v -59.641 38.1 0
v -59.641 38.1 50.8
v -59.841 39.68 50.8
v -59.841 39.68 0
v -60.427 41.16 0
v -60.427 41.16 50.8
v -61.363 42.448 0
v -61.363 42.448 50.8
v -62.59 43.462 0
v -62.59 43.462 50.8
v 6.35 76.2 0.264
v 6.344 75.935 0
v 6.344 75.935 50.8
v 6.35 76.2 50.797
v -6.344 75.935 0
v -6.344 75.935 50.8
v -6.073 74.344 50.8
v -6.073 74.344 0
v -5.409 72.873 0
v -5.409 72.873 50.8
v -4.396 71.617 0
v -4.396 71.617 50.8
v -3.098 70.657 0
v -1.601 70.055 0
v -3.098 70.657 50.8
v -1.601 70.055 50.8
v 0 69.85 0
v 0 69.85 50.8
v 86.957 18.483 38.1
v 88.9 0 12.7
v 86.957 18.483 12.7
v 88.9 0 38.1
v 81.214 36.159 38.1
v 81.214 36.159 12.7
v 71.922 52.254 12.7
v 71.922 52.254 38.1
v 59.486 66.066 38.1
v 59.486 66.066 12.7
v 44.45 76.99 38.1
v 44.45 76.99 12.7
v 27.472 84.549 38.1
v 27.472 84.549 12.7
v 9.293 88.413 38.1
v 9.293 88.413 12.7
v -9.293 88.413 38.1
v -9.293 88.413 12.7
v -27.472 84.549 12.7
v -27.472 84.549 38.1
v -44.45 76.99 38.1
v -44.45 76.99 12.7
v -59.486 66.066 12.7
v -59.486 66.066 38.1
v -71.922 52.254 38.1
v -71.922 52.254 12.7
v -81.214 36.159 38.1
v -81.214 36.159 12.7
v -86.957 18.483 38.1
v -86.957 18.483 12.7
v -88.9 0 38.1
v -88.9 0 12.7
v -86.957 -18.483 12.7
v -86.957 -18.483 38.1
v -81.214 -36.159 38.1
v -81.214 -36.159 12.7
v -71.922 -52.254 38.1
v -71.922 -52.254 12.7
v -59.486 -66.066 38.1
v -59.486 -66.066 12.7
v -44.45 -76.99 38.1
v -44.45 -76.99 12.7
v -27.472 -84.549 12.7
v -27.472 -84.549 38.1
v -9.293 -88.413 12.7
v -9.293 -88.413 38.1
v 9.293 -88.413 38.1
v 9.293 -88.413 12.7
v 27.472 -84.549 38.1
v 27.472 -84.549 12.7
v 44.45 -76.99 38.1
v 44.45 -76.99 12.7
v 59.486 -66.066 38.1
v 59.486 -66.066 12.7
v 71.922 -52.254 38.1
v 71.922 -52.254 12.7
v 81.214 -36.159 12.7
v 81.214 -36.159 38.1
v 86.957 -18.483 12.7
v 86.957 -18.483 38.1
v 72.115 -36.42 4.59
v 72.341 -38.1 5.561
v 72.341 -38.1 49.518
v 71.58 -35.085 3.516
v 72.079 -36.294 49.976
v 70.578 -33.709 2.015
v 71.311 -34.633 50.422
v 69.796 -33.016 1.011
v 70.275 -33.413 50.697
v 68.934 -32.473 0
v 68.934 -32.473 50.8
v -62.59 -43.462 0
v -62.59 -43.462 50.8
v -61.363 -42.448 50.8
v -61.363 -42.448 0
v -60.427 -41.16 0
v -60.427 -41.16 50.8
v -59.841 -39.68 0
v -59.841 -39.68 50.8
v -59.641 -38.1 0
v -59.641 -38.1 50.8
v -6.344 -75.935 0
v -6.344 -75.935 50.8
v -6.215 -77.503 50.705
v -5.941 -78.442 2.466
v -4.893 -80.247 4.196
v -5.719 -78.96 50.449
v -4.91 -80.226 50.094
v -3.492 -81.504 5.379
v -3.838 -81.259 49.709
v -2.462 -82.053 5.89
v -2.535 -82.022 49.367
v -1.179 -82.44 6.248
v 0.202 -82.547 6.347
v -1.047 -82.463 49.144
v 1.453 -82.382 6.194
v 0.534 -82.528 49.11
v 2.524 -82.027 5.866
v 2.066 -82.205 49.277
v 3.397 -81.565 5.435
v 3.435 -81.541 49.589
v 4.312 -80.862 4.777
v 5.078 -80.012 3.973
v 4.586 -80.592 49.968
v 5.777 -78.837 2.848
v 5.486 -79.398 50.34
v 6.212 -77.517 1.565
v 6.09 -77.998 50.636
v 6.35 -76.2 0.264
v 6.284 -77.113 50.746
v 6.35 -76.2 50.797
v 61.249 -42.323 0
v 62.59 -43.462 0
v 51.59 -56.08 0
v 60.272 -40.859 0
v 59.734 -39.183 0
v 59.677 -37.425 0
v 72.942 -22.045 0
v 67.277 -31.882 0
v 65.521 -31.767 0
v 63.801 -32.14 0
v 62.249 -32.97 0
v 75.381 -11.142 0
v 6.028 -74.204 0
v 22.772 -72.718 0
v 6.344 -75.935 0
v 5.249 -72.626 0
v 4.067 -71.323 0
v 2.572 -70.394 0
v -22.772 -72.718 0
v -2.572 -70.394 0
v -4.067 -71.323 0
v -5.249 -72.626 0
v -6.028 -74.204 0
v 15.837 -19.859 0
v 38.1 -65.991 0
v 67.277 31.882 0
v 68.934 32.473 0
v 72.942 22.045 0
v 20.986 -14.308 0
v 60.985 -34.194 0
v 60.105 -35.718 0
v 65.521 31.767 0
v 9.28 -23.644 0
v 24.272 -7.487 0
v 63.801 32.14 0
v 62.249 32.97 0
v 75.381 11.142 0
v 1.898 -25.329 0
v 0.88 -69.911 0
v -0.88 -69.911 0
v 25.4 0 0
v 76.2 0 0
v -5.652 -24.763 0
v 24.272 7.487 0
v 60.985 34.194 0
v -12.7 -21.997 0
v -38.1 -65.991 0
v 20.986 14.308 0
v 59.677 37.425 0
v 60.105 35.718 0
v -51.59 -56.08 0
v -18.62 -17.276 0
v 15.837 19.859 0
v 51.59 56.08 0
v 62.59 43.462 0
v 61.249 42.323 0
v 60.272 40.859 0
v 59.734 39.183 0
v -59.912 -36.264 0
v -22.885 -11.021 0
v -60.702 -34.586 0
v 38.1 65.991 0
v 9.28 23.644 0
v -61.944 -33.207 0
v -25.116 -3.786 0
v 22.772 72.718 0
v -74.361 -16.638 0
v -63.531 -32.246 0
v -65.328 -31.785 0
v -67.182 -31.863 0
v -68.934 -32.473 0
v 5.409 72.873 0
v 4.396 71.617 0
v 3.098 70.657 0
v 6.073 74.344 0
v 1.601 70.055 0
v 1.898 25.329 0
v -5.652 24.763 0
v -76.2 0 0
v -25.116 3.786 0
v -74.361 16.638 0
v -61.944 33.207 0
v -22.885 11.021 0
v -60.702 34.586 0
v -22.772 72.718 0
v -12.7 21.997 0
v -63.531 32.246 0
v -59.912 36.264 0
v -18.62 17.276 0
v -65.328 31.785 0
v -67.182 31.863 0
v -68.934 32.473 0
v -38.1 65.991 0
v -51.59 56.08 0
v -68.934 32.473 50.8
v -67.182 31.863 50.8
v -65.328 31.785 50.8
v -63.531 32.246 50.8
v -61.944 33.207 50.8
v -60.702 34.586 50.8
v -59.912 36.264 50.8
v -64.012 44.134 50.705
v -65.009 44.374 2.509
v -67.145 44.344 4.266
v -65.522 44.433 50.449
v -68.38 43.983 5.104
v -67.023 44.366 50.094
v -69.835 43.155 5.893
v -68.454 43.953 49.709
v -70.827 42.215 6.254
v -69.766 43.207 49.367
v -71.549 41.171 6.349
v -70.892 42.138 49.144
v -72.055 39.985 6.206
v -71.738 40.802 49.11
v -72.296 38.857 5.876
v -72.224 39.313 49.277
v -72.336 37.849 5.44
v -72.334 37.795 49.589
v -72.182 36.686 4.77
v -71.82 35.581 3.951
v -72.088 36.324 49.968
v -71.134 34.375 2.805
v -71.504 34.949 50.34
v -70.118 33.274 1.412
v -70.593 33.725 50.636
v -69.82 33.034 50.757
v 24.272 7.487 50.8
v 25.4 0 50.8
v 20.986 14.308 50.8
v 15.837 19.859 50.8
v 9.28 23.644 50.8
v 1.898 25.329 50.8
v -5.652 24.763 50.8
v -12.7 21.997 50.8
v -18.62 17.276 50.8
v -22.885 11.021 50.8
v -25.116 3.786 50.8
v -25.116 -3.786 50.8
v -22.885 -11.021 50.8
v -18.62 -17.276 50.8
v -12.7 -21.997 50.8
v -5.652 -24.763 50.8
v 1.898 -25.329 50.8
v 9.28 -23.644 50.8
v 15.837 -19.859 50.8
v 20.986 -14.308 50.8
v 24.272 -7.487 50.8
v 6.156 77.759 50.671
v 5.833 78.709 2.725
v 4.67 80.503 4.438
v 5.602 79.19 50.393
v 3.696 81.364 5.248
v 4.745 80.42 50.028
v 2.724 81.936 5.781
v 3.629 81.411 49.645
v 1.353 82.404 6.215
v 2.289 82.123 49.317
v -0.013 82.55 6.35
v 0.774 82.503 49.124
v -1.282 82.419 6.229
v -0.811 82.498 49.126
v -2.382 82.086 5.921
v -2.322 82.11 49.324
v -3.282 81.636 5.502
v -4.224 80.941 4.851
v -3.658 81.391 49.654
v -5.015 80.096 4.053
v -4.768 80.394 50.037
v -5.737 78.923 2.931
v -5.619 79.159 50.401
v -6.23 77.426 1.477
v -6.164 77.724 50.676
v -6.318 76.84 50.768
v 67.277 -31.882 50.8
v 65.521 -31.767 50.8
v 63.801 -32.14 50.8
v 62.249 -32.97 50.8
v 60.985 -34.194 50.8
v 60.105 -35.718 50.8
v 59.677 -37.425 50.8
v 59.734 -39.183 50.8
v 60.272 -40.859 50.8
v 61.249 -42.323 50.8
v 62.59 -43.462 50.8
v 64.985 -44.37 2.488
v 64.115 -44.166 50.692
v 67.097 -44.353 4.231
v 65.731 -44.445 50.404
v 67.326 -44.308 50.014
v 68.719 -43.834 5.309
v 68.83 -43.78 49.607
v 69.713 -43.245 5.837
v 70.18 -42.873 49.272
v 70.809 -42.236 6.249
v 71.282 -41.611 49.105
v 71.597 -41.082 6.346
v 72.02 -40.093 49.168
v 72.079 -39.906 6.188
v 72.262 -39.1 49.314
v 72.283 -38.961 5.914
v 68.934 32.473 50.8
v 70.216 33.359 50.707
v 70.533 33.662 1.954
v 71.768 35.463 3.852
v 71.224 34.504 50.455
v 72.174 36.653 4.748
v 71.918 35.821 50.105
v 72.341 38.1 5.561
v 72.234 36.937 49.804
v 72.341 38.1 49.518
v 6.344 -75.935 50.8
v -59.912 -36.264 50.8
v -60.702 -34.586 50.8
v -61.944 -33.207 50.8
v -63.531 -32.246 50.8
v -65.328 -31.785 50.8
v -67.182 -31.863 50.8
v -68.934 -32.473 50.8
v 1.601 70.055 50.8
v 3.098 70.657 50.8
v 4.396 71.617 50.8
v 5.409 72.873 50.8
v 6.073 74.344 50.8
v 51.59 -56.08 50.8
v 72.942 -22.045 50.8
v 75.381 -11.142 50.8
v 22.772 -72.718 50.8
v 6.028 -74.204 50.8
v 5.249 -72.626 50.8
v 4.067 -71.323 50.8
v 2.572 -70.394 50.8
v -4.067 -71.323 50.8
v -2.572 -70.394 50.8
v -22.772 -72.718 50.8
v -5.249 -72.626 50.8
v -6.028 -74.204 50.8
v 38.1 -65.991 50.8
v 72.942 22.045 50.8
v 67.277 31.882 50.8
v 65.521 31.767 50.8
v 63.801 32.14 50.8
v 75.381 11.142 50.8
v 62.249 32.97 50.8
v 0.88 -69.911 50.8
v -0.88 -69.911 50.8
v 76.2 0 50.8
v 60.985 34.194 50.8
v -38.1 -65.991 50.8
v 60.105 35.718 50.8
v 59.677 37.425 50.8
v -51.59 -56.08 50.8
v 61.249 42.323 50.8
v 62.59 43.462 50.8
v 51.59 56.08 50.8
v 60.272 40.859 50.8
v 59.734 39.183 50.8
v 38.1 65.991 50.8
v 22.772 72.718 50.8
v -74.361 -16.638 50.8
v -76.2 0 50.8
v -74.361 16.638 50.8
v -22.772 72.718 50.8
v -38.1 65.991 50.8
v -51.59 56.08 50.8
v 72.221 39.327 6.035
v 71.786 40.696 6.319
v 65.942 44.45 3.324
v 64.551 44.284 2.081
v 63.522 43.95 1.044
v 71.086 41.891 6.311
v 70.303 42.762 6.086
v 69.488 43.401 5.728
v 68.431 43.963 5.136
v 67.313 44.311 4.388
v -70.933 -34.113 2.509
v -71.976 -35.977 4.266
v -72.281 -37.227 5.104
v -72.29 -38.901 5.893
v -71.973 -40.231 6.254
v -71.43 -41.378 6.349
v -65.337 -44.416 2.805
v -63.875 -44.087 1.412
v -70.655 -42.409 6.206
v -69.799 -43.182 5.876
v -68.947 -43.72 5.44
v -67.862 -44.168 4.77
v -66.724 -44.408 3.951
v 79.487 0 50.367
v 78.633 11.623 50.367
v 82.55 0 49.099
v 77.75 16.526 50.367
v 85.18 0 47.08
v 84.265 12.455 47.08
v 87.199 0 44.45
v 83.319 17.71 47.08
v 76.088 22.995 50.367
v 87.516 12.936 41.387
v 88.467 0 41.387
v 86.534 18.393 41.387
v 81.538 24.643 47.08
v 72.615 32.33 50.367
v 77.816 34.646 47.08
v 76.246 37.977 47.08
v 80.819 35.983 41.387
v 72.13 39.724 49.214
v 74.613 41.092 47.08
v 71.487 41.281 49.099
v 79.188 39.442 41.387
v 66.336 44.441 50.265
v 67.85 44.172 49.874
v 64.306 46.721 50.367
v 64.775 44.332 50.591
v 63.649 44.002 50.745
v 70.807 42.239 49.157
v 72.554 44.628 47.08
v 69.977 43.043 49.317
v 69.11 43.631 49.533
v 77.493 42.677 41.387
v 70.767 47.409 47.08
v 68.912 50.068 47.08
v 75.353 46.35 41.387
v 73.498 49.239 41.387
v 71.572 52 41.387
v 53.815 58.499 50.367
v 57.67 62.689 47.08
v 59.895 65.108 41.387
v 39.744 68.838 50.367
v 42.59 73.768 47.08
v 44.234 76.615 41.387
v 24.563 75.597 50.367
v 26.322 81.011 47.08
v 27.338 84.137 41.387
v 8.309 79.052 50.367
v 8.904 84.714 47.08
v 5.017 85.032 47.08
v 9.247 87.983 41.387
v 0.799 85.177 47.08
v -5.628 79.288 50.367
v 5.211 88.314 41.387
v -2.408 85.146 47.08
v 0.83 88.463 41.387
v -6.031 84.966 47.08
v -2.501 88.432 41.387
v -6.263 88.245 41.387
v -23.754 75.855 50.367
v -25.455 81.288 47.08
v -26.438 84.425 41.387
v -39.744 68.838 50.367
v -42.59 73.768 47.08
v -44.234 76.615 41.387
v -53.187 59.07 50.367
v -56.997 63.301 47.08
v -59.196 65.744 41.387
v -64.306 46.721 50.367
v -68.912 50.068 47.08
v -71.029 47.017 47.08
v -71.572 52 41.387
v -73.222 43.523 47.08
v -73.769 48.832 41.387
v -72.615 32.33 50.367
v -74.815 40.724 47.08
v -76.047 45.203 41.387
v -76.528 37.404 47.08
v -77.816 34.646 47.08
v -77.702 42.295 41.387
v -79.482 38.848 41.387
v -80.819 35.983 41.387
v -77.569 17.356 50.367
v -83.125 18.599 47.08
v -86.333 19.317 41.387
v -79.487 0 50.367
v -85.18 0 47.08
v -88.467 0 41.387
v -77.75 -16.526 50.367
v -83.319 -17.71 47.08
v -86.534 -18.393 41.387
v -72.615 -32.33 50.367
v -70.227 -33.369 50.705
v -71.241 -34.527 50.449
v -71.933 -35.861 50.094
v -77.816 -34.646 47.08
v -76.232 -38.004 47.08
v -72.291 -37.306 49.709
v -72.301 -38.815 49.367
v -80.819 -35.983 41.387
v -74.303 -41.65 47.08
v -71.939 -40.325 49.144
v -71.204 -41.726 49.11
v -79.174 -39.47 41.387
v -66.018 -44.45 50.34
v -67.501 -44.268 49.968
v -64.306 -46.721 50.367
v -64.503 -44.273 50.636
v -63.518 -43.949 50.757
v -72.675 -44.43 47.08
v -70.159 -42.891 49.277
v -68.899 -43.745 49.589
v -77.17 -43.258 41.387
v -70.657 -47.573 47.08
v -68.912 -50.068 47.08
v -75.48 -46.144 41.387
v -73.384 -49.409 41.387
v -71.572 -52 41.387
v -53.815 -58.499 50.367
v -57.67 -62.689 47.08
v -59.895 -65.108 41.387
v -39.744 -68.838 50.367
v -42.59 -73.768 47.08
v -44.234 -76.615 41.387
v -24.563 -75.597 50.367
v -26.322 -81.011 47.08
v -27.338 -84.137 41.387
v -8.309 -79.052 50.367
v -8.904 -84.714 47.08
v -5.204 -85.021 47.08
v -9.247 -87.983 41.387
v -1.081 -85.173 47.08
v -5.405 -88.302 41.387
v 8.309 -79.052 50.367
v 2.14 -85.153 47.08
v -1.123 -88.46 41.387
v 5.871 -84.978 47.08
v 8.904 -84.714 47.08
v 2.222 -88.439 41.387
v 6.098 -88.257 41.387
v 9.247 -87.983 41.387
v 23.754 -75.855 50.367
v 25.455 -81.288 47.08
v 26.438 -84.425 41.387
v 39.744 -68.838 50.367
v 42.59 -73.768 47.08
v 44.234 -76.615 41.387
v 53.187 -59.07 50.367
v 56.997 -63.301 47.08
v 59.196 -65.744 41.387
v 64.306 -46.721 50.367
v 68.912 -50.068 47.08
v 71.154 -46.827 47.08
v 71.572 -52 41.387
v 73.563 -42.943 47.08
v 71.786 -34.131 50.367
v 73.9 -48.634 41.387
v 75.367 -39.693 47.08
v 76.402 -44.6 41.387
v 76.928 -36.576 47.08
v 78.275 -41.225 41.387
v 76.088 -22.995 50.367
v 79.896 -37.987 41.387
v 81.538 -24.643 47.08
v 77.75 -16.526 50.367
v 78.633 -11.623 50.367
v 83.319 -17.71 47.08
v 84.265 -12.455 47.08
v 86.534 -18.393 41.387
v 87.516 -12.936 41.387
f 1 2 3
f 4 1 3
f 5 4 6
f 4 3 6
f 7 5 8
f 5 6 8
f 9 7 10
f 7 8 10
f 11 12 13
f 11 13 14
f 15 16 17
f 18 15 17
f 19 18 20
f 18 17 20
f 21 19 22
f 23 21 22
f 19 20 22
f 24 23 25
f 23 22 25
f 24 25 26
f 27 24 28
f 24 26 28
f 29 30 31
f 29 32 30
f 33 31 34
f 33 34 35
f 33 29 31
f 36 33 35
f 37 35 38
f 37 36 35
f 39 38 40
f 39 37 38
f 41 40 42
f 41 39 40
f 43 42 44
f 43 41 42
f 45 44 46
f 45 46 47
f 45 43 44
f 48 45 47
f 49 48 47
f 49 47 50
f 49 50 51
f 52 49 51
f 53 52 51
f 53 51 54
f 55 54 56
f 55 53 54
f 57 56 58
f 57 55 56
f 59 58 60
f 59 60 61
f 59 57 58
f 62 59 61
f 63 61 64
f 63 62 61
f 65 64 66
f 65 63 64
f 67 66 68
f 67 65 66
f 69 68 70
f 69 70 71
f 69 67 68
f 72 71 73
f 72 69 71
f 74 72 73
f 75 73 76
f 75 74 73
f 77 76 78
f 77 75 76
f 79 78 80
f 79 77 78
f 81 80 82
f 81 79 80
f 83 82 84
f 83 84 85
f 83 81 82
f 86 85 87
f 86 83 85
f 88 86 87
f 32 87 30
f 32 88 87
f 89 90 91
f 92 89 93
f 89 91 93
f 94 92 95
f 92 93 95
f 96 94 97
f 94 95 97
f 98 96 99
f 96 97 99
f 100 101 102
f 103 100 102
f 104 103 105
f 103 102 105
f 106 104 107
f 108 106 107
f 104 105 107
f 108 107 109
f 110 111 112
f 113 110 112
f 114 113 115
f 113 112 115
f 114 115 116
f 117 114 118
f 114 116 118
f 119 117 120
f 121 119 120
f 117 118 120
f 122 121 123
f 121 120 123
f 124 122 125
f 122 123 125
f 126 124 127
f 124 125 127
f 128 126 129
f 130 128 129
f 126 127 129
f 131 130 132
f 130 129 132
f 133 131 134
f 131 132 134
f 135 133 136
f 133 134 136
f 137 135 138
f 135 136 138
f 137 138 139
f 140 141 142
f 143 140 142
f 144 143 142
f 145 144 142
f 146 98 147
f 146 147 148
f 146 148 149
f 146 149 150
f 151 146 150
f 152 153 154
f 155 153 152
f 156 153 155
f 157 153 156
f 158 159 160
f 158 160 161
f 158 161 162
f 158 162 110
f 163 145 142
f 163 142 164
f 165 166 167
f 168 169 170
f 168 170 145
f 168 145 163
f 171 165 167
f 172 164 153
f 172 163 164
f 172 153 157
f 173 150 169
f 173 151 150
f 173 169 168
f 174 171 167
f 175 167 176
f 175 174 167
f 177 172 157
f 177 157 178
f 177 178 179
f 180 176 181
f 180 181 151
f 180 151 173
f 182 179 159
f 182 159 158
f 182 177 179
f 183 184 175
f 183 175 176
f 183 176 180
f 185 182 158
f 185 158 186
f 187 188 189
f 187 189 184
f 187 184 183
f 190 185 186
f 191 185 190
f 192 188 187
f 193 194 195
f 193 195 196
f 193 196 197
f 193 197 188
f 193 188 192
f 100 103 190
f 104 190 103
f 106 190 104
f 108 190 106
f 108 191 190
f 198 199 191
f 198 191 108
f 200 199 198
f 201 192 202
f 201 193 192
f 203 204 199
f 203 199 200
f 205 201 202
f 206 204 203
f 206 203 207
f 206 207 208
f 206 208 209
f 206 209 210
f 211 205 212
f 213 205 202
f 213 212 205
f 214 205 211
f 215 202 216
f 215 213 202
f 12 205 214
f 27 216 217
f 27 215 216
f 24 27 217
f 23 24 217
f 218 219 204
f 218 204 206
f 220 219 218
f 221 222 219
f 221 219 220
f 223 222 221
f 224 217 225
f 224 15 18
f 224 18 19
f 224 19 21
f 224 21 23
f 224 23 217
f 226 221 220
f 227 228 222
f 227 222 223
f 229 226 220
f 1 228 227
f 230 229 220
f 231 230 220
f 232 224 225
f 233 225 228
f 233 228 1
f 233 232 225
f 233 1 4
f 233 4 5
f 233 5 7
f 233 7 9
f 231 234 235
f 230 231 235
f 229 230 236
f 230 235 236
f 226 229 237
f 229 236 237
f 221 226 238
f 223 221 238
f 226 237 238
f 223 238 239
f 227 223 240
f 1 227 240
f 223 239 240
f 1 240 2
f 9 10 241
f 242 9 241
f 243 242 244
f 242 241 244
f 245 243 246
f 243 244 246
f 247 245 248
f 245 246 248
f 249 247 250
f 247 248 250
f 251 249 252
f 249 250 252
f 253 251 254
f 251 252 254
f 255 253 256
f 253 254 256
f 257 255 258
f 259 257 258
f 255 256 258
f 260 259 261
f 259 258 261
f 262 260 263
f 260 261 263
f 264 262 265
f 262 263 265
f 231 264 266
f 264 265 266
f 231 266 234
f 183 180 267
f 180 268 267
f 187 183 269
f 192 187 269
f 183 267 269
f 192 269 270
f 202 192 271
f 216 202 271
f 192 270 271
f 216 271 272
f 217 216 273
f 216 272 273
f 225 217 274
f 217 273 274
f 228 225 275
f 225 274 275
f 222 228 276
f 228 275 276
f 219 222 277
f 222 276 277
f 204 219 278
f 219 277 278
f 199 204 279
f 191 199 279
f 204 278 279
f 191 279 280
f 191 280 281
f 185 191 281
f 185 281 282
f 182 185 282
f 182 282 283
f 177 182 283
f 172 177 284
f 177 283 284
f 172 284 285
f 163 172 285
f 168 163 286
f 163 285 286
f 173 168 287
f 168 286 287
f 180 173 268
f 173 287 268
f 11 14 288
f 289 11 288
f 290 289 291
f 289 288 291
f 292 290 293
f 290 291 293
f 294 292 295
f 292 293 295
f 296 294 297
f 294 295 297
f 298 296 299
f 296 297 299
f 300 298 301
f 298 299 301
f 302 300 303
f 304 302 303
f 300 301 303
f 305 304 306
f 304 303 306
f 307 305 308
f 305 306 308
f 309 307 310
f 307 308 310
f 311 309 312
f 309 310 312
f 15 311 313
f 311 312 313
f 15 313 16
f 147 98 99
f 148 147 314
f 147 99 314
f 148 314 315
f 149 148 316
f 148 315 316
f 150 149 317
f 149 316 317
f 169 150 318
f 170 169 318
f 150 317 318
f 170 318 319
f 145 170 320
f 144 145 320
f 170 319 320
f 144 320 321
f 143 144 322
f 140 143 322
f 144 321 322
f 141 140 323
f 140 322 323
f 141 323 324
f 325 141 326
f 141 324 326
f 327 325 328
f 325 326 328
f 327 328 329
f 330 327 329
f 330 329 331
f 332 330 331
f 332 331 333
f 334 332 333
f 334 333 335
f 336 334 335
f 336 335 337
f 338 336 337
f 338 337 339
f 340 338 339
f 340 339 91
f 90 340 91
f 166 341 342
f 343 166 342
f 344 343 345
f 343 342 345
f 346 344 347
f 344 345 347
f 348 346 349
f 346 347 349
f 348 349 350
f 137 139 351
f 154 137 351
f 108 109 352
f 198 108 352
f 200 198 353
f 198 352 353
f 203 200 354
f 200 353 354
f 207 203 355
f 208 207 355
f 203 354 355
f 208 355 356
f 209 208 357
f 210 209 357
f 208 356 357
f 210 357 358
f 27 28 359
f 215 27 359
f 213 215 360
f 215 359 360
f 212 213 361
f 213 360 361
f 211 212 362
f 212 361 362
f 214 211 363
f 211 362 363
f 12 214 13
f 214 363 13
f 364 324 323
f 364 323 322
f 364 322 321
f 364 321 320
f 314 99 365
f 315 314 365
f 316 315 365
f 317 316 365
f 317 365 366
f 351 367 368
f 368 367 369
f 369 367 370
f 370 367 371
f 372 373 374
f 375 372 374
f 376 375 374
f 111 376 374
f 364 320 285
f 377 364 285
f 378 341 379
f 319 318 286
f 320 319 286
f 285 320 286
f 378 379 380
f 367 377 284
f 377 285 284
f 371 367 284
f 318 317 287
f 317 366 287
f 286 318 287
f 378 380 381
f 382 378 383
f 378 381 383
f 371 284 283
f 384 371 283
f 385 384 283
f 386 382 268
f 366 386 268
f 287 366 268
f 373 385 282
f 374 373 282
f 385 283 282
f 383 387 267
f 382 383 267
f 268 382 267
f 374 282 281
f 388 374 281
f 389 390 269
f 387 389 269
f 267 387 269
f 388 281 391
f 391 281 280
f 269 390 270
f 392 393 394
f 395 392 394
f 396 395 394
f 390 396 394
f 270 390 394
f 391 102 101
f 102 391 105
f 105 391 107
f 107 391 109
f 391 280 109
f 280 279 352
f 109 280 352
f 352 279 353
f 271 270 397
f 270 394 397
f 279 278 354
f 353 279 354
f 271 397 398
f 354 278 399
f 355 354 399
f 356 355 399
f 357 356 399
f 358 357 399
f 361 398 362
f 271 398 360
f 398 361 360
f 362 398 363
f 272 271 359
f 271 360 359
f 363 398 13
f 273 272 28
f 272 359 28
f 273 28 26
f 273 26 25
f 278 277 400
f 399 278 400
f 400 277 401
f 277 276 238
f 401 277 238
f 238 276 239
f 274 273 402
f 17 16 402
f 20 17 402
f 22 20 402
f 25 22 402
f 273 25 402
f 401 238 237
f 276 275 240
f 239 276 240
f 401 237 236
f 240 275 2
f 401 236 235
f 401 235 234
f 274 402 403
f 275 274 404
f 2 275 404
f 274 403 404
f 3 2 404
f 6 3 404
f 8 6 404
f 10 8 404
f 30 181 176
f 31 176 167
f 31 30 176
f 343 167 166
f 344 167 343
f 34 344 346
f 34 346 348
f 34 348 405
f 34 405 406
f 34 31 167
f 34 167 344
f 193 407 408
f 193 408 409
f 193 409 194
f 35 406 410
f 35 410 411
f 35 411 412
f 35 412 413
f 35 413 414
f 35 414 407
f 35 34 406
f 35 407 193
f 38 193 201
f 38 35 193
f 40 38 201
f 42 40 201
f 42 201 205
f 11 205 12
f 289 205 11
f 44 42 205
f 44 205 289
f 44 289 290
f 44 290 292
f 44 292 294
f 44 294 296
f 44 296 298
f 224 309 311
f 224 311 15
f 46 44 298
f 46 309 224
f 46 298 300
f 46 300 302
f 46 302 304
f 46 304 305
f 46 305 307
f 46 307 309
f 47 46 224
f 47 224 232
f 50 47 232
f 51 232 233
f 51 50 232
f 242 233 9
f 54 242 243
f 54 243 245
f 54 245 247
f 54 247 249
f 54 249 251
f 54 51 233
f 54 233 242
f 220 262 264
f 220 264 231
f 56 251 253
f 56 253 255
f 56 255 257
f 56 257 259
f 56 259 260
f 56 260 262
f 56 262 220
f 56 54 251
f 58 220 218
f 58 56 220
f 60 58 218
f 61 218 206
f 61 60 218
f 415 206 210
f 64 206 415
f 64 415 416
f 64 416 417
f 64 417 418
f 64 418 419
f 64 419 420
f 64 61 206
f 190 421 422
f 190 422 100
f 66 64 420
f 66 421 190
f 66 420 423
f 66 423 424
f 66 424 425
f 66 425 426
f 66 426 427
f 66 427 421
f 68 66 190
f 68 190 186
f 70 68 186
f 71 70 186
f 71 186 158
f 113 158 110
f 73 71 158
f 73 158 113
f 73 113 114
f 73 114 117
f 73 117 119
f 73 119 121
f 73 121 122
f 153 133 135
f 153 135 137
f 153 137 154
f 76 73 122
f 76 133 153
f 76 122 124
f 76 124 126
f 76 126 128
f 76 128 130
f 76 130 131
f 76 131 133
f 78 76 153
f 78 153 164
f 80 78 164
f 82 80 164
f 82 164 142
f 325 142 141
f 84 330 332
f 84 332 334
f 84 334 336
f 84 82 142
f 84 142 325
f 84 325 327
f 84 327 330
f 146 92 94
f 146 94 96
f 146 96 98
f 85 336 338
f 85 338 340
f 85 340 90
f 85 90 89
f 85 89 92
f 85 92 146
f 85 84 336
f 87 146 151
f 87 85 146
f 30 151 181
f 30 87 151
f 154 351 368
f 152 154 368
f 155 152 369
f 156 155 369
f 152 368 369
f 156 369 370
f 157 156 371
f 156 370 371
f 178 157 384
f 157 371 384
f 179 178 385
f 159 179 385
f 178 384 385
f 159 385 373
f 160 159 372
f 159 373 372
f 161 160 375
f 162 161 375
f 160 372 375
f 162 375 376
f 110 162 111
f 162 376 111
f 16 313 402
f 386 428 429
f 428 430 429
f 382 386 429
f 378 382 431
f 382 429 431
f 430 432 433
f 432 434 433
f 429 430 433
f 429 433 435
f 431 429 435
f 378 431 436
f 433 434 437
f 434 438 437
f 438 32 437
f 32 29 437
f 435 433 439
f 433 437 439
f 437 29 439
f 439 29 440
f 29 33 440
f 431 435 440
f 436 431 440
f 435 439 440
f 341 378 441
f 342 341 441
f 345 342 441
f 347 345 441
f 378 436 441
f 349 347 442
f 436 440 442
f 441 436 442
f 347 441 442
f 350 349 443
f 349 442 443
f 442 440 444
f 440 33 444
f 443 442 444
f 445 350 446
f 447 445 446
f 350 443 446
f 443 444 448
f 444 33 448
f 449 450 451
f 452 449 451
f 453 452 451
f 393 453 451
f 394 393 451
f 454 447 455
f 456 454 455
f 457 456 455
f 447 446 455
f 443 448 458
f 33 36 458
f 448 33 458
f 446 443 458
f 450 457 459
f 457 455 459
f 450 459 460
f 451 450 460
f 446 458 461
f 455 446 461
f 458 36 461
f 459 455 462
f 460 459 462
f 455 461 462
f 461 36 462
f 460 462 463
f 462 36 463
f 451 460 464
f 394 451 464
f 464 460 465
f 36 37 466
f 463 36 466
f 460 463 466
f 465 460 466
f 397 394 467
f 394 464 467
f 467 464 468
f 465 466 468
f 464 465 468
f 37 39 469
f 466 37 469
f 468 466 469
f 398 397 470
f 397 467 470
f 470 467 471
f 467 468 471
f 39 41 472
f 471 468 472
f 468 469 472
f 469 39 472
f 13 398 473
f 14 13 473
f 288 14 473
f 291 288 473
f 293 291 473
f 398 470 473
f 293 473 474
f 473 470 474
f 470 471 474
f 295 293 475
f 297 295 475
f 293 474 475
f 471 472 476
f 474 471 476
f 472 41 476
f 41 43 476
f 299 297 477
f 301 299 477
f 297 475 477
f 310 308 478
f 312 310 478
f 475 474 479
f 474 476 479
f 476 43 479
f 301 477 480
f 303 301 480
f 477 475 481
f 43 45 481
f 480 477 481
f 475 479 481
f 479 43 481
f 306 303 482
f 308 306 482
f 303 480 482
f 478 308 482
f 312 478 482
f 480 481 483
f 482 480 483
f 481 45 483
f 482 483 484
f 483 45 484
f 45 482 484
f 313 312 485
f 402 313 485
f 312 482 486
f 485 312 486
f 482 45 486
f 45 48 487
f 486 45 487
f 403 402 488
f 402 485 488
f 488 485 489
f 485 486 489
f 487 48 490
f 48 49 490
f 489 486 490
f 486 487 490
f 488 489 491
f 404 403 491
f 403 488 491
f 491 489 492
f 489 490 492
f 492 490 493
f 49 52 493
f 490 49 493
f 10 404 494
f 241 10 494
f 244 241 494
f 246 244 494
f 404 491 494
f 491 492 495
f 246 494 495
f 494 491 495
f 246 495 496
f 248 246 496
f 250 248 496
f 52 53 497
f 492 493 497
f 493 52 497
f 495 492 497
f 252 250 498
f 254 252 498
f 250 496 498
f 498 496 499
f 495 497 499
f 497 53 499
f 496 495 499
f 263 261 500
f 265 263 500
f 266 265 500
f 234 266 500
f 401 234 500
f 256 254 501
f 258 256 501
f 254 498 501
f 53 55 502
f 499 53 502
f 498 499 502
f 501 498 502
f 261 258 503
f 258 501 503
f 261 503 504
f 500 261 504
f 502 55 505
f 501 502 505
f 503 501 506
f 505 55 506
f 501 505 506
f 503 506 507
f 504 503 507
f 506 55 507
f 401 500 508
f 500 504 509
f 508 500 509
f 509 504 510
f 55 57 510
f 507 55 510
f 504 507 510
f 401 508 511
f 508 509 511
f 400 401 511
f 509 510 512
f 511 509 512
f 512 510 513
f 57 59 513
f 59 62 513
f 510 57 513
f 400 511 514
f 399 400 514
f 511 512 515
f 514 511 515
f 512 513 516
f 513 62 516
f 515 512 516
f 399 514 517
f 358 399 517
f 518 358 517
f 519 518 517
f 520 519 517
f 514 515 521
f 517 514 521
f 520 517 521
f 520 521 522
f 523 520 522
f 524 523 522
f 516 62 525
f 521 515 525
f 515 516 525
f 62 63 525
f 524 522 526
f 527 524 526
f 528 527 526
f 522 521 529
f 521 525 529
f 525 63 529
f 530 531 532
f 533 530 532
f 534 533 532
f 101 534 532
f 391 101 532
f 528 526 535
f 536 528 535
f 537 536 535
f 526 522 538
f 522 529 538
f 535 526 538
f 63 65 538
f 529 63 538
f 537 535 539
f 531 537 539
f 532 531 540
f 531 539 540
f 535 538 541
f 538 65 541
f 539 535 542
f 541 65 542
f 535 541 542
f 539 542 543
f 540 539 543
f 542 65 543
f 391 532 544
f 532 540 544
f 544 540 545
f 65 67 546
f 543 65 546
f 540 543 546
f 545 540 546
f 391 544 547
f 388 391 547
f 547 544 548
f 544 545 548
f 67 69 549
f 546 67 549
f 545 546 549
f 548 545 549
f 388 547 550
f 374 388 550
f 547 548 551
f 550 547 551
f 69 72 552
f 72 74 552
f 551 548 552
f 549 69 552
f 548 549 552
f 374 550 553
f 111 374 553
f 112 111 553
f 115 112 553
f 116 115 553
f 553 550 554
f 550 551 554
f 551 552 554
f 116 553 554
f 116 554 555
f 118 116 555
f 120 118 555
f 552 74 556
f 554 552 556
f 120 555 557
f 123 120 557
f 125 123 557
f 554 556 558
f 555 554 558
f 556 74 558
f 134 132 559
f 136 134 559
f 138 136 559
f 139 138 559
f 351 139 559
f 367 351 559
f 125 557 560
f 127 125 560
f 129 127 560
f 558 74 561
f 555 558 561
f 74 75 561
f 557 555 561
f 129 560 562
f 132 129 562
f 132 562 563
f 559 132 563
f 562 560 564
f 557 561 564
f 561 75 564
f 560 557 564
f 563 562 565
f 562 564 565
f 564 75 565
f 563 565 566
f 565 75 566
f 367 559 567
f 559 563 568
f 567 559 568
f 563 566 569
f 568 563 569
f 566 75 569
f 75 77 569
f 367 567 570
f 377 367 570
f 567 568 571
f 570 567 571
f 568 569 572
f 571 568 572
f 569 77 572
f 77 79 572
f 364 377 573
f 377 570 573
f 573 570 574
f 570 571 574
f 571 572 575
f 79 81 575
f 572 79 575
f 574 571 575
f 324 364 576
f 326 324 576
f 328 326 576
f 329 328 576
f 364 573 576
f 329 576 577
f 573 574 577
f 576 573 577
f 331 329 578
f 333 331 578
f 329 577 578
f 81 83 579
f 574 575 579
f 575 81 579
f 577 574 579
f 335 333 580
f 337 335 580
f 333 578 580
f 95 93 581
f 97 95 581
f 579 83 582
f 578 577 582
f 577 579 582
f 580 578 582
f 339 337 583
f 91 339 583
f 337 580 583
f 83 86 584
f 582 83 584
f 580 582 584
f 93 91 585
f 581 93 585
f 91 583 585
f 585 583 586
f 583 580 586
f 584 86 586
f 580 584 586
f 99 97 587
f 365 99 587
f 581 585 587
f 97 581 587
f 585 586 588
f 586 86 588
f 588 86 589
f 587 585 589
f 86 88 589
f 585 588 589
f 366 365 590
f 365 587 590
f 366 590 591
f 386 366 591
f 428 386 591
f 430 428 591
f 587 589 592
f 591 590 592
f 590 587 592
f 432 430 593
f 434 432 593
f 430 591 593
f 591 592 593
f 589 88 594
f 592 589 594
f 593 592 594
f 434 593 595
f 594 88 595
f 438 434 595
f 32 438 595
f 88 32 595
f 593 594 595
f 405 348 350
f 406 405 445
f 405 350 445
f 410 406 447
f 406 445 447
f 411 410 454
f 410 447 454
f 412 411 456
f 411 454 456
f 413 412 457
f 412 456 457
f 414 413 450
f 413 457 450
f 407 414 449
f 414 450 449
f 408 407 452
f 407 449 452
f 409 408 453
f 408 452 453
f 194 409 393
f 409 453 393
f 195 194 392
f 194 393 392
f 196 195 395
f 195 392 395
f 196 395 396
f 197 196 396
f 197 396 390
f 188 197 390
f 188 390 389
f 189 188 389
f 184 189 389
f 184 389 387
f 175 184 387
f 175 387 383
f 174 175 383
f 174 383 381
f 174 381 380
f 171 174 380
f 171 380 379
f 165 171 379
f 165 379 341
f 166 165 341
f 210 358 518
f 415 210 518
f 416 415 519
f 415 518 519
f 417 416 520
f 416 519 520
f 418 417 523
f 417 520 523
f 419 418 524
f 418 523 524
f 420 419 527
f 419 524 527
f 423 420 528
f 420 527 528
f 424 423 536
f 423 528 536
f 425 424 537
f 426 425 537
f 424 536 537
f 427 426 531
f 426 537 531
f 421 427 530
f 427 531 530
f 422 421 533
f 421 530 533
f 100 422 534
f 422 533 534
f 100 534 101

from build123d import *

# Parameters (mm, degrees)
F0_W     = 63.5
F0_H     = 50.8
F4_DEPTH = 76.201


# Not quite as in the source:
# - a fillet or chamfer that OpenCascade refuses, or shapes differently, is made with other operations: its cross-section is extruded or revolved along the edge and cut away or added


with BuildPart() as f1:
    # F0 (on Front) → F1 (revolve)
    with BuildSketch(Plane.XZ):
        with Locations((57.15, 25.4)):
            Rectangle(F0_W, F0_H)
    revolve(axis=Axis((0, 0, 63.5), (0, 0, 1)))

    # F3 (on offset) → F4 (cut, through all)
    with BuildSketch(Plane.XY.offset(76.2)):
        with BuildLine():
            ThreePointArc((0, 76.2), (3.175, 76.1338254326), (6.3444854527, 75.9354166667))
            ThreePointArc((6.3444854527, 75.9354166667), (6.3486212135, 76.0676796024), (6.35, 76.2))
            ThreePointArc((6.35, 76.2), (-0.1323203976, 82.5486212135), (-6.3444854527, 75.9354166667))
            ThreePointArc((-6.3444854527, 75.9354166667), (-3.175, 76.1338254326), (0, 76.2))
        make_face()
        with BuildLine():
            Line((0, 69.85), (0, 76.2))
            ThreePointArc((0, 76.2), (-3.175, 76.1338254326), (-6.3444854527, 75.9354166667))
            ThreePointArc((-6.3444854527, 75.9354166667), (-4.3955884608, 71.6172822383), (0, 69.85))
        make_face()
        with BuildLine():
            ThreePointArc((0, 69.85), (4.3955884608, 71.6172822383), (6.3444854527, 75.9354166667))
            ThreePointArc((6.3444854527, 75.9354166667), (3.175, 76.1338254326), (0, 76.2))
            Line((0, 76.2), (0, 69.85))
        make_face()
        with BuildLine():
            ThreePointArc((62.5897571539, 43.4621939093), (65.9911357684, 38.1), (68.9342426066, 32.4732227573))
            ThreePointArc((68.9342426066, 32.4732227573), (71.4230428194, 34.8110965675), (72.3411357684, 38.1))
            ThreePointArc((72.3411357684, 38.1), (69.0508535493, 43.6642274487), (62.5897571539, 43.4621939093))
        make_face()
        with BuildLine():
            ThreePointArc((62.5897571539, 43.4621939093), (60.4918744543, 34.925), (68.9342426066, 32.4732227573))
            ThreePointArc((68.9342426066, 32.4732227573), (65.9911357684, 38.1), (62.5897571539, 43.4621939093))
        make_face()
        with BuildLine():
            ThreePointArc((62.5897571539, -43.4621939093), (65.9911357684, -38.1), (68.9342426066, -32.4732227573))
            ThreePointArc((68.9342426066, -32.4732227573), (60.4918744543, -34.925), (62.5897571539, -43.4621939093))
        make_face()
        with BuildLine():
            ThreePointArc((72.3411357684, -38.1), (71.4230428194, -34.8110965675), (68.9342426066, -32.4732227573))
            ThreePointArc((68.9342426066, -32.4732227573), (65.9911357684, -38.1), (62.5897571539, -43.4621939093))
            ThreePointArc((62.5897571539, -43.4621939093), (69.0508535493, -43.6642274487), (72.3411357684, -38.1))
        make_face()
        with BuildLine():
            ThreePointArc((-6.3444854527, -75.9354166667), (0, -76.2), (6.3444854527, -75.9354166667))
            ThreePointArc((6.3444854527, -75.9354166667), (0, -69.85), (-6.3444854527, -75.9354166667))
        make_face()
        with BuildLine():
            ThreePointArc((6.35, -76.2), (6.3486212135, -76.0676796024), (6.3444854527, -75.9354166667))
            ThreePointArc((6.3444854527, -75.9354166667), (0, -76.2), (-6.3444854527, -75.9354166667))
            ThreePointArc((-6.3444854527, -75.9354166667), (-0.1323203976, -82.5486212135), (6.35, -76.2))
        make_face()
        with BuildLine():
            ThreePointArc((-68.9342426066, -32.4732227573), (-71.4903970824, -41.275), (-62.5897571539, -43.4621939093))
            ThreePointArc((-62.5897571539, -43.4621939093), (-65.9911357684, -38.1), (-68.9342426066, -32.4732227573))
        make_face()
        with BuildLine():
            ThreePointArc((-68.9342426066, -32.4732227573), (-65.9911357684, -38.1), (-62.5897571539, -43.4621939093))
            ThreePointArc((-62.5897571539, -43.4621939093), (-60.4269083197, -41.159717781), (-59.6411357684, -38.1))
            ThreePointArc((-59.6411357684, -38.1), (-62.7022323358, -32.6680929489), (-68.9342426066, -32.4732227573))
        make_face()
        with BuildLine():
            ThreePointArc((-68.9342426066, 32.4732227573), (-65.9911357684, 38.1), (-62.5897571539, 43.4621939093))
            ThreePointArc((-62.5897571539, 43.4621939093), (-71.4903970824, 41.275), (-68.9342426066, 32.4732227573))
        make_face()
        with BuildLine():
            ThreePointArc((-59.6411357684, 38.1), (-60.4269083197, 41.159717781), (-62.5897571539, 43.4621939093))
            ThreePointArc((-62.5897571539, 43.4621939093), (-65.9911357684, 38.1), (-68.9342426066, 32.4732227573))
            ThreePointArc((-68.9342426066, 32.4732227573), (-62.7022323358, 32.6680929489), (-59.6411357684, 38.1))
        make_face()
    extrude(amount=-F4_DEPTH, mode=Mode.SUBTRACT)

    # F5: fillet of radius 12.7 on 1 edges, made by hand

    # F5_s1 → F5_t2 (revolve, cut)
    with BuildSketch(Plane.XZ):
        with BuildLine():
            ThreePointArc((76.2, 50.8), (85.1802561211, 47.0802561211), (88.9, 38.1))
            Line((88.9, 38.1), (88.9, 50.8))
            Line((88.9, 50.8), (76.2, 50.8))
        make_face()
    revolve(axis=Axis((0, 0, 50.8), (0, 0, 1)), mode=Mode.SUBTRACT)

    # F6: chamfer of 12.7 on 3 edges, made by hand

    # F6_s1 → F6_t2 (revolve, cut)
    with BuildSketch(Plane.XZ):
        Polygon((76.2, 0), (88.9, 12.7), (88.9, 0), align=None)
    revolve(axis=Axis((0, 0, 0), (0, 0, 1)), mode=Mode.SUBTRACT)


solid = f1.part
